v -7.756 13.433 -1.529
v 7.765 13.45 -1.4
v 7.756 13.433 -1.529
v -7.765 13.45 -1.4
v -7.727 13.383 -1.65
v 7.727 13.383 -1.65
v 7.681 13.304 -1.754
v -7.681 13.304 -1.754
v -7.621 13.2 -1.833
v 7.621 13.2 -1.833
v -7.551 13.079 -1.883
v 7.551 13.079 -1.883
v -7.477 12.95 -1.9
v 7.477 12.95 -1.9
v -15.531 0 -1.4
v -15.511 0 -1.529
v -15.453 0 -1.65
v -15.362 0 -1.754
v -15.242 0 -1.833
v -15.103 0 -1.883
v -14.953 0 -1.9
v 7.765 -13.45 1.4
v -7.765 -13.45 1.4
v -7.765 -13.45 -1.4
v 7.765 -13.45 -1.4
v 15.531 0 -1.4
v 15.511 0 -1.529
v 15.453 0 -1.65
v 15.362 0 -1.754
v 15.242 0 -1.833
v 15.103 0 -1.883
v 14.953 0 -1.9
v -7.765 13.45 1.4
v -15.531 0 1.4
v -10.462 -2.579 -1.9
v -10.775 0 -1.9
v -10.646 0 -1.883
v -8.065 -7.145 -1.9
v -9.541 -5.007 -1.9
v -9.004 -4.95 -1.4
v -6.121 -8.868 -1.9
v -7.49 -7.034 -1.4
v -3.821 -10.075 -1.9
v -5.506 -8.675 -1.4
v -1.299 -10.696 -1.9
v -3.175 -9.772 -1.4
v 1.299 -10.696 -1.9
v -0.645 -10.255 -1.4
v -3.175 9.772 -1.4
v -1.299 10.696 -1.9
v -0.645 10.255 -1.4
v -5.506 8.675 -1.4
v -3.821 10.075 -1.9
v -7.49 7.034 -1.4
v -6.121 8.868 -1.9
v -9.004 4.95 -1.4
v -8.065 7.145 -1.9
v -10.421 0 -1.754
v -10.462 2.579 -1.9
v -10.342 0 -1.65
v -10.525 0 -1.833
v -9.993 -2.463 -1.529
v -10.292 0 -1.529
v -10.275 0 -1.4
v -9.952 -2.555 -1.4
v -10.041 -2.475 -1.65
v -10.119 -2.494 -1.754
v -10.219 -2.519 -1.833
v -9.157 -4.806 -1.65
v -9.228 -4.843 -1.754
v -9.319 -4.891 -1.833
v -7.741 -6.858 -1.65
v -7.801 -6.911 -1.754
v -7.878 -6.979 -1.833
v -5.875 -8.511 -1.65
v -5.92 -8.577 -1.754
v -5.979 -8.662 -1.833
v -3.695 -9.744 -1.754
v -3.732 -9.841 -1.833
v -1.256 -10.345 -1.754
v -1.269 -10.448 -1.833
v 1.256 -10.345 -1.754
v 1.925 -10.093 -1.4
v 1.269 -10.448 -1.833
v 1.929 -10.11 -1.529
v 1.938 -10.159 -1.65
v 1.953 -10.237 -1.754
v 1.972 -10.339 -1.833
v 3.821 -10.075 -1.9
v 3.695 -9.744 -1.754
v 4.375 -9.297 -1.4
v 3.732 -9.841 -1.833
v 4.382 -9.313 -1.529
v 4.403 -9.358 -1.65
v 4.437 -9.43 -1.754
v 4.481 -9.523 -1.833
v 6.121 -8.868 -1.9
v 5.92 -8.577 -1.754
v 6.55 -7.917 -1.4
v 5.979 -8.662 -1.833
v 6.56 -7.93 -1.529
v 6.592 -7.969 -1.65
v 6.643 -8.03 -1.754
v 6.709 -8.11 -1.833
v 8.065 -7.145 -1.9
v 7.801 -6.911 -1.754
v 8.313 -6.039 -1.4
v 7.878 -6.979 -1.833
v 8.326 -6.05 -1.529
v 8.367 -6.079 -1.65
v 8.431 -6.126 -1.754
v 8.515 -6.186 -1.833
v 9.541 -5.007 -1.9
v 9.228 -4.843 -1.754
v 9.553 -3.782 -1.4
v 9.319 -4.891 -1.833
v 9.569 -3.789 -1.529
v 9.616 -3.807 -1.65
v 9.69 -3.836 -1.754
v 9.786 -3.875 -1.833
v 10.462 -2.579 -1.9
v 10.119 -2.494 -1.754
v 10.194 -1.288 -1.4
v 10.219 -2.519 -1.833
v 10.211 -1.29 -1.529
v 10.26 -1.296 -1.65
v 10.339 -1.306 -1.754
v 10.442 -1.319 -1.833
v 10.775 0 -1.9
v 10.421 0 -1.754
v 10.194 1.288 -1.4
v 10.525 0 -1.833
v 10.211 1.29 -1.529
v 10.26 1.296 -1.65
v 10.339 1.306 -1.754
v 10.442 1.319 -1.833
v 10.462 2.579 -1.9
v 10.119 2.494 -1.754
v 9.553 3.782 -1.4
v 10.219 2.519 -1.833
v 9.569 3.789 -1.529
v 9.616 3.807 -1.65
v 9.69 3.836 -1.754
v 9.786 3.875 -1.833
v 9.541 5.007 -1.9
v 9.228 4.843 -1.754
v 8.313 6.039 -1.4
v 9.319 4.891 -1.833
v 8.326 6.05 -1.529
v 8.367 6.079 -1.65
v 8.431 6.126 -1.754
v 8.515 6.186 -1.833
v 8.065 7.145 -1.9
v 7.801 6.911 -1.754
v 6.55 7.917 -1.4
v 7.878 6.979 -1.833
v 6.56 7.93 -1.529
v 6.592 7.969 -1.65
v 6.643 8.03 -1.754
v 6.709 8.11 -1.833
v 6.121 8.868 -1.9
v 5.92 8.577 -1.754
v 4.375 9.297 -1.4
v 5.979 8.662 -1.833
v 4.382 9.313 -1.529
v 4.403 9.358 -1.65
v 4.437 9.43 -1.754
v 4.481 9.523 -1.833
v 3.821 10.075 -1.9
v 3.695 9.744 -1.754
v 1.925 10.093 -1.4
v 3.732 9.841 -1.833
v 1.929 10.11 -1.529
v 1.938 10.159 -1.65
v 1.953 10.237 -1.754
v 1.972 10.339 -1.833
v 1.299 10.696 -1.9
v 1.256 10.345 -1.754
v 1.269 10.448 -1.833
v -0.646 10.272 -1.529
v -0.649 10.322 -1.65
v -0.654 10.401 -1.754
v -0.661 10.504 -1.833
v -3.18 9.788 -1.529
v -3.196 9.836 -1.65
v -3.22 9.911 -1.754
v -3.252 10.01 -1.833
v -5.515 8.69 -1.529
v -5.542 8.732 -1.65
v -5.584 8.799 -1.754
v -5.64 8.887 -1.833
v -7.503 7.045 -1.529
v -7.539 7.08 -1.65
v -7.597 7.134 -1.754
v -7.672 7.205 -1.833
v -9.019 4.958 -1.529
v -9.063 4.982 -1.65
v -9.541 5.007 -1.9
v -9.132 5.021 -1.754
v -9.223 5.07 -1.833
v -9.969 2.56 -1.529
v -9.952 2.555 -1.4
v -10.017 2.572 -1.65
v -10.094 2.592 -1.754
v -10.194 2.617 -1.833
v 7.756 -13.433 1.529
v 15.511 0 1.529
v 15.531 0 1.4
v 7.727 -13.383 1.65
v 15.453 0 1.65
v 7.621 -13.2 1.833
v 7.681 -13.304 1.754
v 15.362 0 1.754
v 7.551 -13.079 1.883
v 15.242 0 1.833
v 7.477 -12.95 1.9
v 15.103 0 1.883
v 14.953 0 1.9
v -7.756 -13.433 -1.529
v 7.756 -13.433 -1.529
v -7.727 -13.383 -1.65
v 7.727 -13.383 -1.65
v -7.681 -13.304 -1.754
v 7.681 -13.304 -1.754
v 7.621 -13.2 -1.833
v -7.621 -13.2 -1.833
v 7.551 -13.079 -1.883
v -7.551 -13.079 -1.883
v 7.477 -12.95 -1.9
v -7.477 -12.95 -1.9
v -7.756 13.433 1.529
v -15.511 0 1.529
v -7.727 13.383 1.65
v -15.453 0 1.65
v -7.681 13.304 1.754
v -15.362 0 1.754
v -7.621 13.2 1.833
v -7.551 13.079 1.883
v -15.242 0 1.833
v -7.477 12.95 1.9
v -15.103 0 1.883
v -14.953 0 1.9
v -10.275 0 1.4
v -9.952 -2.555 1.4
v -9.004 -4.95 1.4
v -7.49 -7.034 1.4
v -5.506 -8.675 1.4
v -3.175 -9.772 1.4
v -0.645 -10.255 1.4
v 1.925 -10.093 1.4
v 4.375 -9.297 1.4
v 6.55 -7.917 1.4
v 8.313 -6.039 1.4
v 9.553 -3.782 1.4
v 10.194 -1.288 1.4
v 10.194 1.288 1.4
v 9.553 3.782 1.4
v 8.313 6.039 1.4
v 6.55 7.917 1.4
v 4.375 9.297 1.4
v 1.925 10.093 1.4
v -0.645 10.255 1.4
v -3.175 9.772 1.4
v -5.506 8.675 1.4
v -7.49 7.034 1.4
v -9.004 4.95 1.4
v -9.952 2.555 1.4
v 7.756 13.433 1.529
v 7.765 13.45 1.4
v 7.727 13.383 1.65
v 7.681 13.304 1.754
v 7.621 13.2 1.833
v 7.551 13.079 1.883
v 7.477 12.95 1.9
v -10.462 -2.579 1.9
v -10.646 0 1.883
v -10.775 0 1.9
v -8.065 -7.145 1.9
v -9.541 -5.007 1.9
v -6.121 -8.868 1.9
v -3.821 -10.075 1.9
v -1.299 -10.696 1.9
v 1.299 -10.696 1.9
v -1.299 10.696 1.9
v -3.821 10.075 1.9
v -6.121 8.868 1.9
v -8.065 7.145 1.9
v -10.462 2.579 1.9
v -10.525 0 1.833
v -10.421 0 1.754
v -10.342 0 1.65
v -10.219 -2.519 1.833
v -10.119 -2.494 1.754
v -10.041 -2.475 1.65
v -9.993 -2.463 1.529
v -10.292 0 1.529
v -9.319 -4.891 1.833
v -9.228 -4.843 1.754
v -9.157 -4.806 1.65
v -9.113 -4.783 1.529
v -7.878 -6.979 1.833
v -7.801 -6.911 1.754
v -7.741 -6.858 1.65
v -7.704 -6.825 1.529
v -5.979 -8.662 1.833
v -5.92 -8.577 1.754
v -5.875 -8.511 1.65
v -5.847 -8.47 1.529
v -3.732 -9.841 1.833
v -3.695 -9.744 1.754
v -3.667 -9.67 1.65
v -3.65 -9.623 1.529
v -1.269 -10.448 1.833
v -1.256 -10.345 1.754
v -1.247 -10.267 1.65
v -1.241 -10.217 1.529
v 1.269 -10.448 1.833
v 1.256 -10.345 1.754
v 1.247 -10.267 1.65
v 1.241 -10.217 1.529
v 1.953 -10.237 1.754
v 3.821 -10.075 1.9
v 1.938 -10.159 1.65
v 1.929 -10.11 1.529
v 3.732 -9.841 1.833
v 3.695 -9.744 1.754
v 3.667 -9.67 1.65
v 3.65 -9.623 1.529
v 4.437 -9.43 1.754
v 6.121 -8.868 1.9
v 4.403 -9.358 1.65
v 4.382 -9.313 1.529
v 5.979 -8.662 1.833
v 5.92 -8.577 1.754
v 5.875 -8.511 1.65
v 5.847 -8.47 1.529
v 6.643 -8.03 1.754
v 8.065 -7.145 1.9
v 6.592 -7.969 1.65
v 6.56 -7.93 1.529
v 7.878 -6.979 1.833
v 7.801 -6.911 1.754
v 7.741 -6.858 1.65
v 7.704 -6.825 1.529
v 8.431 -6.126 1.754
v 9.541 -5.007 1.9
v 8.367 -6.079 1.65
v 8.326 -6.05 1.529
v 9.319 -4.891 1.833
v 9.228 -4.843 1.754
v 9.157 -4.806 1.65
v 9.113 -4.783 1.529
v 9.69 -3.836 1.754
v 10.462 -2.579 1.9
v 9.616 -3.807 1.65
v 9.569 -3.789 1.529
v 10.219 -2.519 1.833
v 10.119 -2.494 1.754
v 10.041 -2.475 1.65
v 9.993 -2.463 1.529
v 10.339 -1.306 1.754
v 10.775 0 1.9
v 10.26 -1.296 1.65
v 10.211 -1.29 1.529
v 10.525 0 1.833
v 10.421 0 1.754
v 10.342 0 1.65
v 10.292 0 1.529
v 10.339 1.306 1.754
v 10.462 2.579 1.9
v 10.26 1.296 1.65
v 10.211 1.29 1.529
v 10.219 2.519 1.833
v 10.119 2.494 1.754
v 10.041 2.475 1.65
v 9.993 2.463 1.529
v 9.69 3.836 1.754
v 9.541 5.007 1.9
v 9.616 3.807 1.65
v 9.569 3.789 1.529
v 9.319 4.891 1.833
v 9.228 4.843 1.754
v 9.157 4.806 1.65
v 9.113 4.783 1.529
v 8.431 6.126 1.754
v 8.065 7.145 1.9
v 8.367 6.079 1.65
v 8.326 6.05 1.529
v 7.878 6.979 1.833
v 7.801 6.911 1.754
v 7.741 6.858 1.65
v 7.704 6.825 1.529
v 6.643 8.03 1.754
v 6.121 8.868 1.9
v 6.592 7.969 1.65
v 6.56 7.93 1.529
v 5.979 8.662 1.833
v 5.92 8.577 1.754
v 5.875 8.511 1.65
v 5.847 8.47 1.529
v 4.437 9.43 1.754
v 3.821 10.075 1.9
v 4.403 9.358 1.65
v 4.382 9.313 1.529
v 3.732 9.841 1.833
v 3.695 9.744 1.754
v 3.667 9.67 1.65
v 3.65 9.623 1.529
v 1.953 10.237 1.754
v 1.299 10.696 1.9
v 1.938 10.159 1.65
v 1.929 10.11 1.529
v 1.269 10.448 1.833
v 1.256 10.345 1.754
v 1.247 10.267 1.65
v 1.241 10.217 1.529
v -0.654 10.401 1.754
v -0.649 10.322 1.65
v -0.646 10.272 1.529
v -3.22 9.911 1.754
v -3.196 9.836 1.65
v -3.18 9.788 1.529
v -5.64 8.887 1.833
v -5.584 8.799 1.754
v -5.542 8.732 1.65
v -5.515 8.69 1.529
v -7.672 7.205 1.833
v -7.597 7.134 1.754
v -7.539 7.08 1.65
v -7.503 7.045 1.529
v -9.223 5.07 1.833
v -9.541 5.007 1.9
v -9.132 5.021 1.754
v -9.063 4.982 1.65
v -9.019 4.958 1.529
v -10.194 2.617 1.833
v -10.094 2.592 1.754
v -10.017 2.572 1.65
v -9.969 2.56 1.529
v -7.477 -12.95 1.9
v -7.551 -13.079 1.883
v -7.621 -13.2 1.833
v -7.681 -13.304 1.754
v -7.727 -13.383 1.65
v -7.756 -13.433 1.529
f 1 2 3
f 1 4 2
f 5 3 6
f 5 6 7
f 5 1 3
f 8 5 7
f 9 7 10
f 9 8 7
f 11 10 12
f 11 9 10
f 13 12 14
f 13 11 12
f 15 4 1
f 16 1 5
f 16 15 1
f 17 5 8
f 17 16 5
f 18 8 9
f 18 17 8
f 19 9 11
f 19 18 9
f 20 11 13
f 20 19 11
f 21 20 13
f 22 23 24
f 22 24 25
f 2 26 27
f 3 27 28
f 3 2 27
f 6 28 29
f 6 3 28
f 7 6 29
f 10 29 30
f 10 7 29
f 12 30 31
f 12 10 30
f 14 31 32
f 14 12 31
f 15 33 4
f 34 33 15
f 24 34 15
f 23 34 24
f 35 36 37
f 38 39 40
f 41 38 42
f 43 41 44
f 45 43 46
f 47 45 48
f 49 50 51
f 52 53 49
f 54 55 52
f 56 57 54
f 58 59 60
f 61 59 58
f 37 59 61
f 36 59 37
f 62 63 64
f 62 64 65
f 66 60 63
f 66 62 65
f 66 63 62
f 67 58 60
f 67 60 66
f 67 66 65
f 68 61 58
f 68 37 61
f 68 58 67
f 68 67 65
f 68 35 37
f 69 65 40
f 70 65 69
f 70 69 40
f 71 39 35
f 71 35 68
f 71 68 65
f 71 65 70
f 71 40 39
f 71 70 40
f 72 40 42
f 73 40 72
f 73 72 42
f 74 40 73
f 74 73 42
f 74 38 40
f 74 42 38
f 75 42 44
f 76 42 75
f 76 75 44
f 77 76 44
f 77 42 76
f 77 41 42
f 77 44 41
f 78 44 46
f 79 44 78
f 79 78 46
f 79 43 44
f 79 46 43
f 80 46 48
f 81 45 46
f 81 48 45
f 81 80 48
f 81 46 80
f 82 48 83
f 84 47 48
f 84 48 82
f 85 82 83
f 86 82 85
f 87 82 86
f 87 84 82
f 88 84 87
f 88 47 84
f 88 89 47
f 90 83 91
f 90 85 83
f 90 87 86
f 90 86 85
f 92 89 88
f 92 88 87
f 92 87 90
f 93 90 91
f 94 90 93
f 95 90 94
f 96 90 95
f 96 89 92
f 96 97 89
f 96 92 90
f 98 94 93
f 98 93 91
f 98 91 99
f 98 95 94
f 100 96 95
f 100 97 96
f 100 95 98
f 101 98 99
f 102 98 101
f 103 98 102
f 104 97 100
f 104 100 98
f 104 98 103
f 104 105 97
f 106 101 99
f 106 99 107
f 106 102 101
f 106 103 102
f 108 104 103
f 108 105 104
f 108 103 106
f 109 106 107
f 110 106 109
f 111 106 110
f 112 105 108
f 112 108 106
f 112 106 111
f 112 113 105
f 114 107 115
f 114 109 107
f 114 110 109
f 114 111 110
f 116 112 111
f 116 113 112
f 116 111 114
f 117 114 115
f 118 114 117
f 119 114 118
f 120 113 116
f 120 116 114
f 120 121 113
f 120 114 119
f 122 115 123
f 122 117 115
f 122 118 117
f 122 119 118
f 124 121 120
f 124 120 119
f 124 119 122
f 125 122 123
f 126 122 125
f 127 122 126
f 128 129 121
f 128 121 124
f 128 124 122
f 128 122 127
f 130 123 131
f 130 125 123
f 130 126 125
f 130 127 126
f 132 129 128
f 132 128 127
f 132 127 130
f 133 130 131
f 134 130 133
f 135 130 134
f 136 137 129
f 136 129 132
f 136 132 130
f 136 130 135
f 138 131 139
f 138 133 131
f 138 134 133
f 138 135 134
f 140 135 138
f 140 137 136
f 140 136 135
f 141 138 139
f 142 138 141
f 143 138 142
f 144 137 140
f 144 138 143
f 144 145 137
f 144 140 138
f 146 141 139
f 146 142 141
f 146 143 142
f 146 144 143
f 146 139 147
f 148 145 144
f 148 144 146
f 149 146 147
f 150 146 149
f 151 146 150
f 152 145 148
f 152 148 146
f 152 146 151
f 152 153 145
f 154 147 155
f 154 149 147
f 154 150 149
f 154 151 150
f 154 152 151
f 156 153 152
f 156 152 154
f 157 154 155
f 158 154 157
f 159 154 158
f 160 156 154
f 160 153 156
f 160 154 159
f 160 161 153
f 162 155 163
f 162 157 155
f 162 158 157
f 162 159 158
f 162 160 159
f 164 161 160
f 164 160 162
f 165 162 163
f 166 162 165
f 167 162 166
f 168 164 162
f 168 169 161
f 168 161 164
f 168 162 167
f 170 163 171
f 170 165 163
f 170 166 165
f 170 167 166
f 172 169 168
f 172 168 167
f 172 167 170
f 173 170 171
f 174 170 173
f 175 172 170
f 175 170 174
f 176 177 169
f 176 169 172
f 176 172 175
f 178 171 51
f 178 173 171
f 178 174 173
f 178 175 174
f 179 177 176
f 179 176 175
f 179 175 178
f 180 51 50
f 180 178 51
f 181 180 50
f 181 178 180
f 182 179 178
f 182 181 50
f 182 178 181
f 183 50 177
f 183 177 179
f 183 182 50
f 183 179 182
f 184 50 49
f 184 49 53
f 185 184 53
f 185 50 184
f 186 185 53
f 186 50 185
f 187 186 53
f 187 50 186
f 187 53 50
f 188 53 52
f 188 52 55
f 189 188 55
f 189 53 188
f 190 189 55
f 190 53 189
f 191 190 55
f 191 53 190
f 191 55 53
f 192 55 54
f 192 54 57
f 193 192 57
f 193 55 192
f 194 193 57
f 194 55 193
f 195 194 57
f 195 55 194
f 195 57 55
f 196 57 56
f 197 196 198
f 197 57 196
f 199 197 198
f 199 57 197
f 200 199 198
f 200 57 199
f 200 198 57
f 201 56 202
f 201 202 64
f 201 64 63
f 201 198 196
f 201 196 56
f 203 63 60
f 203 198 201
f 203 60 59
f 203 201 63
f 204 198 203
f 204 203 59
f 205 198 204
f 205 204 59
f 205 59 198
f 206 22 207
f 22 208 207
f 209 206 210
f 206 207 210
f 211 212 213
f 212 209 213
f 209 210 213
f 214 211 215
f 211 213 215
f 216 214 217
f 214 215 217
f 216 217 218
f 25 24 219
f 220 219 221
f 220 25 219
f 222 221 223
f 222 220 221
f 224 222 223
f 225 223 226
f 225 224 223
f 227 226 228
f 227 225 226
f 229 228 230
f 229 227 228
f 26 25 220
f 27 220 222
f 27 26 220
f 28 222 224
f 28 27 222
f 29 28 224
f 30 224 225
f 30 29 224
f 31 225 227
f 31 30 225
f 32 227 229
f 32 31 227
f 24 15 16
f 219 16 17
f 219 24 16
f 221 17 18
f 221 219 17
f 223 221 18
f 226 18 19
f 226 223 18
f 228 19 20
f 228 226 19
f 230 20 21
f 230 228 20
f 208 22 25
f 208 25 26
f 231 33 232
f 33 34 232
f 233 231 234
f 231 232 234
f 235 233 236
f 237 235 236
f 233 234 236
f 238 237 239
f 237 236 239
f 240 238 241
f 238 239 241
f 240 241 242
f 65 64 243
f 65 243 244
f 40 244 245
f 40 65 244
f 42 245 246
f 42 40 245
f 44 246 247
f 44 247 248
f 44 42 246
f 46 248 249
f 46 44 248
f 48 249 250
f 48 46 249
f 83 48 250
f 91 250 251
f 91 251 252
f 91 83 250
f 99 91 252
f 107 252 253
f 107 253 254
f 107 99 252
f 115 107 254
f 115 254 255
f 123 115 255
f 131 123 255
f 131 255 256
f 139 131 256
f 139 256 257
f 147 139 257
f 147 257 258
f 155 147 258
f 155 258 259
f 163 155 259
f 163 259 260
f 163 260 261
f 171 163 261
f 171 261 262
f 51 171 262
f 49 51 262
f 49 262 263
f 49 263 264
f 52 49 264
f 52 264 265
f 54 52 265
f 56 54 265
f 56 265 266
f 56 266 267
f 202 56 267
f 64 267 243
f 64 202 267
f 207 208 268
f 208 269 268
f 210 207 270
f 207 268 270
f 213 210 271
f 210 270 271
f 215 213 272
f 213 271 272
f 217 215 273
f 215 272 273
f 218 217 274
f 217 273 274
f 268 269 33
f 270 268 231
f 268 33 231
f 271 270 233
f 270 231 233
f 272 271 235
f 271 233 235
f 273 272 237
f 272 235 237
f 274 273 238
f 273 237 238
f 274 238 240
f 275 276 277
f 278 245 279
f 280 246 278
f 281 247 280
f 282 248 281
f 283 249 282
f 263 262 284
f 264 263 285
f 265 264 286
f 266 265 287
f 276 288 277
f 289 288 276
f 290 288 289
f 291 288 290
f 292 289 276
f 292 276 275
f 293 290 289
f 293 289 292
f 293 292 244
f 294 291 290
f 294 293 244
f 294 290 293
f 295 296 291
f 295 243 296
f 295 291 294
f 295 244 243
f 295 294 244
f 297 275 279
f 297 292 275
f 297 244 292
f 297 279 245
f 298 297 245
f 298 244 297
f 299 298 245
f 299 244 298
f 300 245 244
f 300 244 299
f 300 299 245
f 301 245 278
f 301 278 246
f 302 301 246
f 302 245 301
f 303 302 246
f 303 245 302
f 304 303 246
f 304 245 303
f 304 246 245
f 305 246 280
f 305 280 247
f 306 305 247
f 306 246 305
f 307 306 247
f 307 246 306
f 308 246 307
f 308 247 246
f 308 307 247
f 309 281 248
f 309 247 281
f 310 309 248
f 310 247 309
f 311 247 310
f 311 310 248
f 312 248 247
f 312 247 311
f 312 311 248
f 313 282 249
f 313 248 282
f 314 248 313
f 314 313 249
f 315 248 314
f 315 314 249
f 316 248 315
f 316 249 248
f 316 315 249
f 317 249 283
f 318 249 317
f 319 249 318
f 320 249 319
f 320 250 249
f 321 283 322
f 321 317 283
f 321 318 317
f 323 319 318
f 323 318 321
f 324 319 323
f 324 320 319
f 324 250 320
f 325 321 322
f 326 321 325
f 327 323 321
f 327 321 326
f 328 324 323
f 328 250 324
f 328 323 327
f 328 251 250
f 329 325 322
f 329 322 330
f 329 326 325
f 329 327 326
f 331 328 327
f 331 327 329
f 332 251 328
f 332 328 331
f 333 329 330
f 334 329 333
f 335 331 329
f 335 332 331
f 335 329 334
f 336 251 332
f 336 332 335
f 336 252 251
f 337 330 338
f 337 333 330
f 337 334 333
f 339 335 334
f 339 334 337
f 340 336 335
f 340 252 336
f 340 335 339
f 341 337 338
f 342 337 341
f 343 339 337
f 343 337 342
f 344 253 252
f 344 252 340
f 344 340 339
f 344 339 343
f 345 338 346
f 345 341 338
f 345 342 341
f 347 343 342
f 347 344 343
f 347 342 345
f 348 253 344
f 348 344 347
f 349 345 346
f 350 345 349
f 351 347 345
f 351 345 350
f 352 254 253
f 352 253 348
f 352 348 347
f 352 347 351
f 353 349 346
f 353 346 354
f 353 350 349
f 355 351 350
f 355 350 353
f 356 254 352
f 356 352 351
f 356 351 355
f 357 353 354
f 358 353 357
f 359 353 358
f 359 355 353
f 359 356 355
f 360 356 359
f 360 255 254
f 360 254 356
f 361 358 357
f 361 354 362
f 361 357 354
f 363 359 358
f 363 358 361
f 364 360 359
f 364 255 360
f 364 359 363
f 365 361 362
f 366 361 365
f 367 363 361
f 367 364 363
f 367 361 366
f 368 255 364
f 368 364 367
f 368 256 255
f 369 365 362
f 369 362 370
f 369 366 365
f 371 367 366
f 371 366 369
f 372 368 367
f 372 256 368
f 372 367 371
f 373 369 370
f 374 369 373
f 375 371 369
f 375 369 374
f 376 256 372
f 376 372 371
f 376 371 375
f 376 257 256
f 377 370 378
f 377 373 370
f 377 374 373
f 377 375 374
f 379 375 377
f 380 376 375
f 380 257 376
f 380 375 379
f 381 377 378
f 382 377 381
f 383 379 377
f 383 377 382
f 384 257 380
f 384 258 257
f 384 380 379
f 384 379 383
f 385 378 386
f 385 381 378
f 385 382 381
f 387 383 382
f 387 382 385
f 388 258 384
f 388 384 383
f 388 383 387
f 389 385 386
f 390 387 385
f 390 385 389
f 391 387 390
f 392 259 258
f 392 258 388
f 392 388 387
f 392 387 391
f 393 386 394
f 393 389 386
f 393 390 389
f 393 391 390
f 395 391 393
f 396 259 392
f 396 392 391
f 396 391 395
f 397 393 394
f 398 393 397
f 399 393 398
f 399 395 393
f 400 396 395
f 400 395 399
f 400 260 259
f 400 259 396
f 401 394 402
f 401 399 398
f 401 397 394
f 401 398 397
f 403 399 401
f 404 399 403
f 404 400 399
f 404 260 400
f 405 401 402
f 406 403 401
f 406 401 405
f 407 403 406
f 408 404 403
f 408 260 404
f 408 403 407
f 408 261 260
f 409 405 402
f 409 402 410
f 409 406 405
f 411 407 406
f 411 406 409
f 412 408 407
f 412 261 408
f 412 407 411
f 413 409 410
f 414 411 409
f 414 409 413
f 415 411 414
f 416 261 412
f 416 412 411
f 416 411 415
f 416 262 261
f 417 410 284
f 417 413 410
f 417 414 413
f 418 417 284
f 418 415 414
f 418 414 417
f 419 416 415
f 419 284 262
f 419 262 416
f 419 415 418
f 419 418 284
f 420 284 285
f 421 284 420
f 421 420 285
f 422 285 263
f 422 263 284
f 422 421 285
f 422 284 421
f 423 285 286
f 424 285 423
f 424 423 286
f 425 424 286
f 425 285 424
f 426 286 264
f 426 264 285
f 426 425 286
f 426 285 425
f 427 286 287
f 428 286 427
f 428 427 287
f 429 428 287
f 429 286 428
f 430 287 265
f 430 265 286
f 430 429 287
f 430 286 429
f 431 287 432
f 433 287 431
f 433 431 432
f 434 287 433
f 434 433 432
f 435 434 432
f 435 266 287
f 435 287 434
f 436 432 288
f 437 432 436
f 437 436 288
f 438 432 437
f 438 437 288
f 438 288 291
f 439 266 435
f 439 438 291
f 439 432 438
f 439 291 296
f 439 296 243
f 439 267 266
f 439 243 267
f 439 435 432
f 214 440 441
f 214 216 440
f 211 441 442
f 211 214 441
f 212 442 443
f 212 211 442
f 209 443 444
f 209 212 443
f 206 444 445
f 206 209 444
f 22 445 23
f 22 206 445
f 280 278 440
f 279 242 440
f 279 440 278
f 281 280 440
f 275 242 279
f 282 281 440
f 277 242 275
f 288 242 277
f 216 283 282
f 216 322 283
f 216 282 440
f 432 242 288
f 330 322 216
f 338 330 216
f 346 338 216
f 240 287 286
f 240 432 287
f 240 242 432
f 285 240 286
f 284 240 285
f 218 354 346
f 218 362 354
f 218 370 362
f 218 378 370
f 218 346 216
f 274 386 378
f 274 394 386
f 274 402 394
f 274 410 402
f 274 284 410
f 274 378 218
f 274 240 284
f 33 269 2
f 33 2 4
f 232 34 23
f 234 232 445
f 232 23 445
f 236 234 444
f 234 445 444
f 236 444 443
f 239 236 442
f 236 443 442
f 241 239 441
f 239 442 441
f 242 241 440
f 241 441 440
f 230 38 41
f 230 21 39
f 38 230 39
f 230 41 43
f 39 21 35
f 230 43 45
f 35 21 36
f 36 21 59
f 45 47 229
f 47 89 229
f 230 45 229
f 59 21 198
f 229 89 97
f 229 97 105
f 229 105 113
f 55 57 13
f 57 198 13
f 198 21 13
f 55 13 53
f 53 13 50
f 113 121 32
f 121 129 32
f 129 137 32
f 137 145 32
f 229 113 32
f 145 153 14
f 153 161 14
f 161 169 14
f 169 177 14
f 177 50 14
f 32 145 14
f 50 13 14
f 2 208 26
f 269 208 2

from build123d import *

# Parameters (mm, degrees)
SCHIZZO1_R                   = 10.275
ESTRUSIONE_ESTRUSIONE1_DEPTH = 1.9
RACCORDO1_R                  = 0.5


with BuildPart() as part:
    # Schizzo1 → Estrusione-Estrusione1 (new, symmetric)
    with BuildSketch(Plane.XY):
        Polygon((-15.530722241, 0), (-7.765361121, -13.45), (7.765361121, -13.45), (15.530722241, 0), (7.765361121, 13.45), (-7.765361121, 13.45), align=None)
        with Locations(Location((0, 0, 0), (0, 0, 180))):
            Circle(SCHIZZO1_R, mode=Mode.SUBTRACT)
    extrude(amount=ESTRUSIONE_ESTRUSIONE1_DEPTH, both=True)

    # Raccordo1
    raccordo1_edges = [part.edges().sort_by_distance(p)[0] for p in [
        (0, -13.45, 1.9),
        (11.648041681, -6.725, 1.9),
        (11.648041681, 6.725, 1.9),
        (10.275, 0, -1.9),
        (10.275, 0, 1.9),
        (0, 13.45, 1.9),
        (-11.648041681, 6.725, 1.9),
        (0, 13.45, -1.9),
        (11.648041681, 6.725, -1.9),
        (11.648041681, -6.725, -1.9),
        (-11.648041681, -6.725, 1.9),
        (0, -13.45, -1.9),
        (-11.648041681, -6.725, -1.9),
        (-11.648041681, 6.725, -1.9),
    ]]
    fillet(raccordo1_edges, radius=RACCORDO1_R)


solid = part.part
